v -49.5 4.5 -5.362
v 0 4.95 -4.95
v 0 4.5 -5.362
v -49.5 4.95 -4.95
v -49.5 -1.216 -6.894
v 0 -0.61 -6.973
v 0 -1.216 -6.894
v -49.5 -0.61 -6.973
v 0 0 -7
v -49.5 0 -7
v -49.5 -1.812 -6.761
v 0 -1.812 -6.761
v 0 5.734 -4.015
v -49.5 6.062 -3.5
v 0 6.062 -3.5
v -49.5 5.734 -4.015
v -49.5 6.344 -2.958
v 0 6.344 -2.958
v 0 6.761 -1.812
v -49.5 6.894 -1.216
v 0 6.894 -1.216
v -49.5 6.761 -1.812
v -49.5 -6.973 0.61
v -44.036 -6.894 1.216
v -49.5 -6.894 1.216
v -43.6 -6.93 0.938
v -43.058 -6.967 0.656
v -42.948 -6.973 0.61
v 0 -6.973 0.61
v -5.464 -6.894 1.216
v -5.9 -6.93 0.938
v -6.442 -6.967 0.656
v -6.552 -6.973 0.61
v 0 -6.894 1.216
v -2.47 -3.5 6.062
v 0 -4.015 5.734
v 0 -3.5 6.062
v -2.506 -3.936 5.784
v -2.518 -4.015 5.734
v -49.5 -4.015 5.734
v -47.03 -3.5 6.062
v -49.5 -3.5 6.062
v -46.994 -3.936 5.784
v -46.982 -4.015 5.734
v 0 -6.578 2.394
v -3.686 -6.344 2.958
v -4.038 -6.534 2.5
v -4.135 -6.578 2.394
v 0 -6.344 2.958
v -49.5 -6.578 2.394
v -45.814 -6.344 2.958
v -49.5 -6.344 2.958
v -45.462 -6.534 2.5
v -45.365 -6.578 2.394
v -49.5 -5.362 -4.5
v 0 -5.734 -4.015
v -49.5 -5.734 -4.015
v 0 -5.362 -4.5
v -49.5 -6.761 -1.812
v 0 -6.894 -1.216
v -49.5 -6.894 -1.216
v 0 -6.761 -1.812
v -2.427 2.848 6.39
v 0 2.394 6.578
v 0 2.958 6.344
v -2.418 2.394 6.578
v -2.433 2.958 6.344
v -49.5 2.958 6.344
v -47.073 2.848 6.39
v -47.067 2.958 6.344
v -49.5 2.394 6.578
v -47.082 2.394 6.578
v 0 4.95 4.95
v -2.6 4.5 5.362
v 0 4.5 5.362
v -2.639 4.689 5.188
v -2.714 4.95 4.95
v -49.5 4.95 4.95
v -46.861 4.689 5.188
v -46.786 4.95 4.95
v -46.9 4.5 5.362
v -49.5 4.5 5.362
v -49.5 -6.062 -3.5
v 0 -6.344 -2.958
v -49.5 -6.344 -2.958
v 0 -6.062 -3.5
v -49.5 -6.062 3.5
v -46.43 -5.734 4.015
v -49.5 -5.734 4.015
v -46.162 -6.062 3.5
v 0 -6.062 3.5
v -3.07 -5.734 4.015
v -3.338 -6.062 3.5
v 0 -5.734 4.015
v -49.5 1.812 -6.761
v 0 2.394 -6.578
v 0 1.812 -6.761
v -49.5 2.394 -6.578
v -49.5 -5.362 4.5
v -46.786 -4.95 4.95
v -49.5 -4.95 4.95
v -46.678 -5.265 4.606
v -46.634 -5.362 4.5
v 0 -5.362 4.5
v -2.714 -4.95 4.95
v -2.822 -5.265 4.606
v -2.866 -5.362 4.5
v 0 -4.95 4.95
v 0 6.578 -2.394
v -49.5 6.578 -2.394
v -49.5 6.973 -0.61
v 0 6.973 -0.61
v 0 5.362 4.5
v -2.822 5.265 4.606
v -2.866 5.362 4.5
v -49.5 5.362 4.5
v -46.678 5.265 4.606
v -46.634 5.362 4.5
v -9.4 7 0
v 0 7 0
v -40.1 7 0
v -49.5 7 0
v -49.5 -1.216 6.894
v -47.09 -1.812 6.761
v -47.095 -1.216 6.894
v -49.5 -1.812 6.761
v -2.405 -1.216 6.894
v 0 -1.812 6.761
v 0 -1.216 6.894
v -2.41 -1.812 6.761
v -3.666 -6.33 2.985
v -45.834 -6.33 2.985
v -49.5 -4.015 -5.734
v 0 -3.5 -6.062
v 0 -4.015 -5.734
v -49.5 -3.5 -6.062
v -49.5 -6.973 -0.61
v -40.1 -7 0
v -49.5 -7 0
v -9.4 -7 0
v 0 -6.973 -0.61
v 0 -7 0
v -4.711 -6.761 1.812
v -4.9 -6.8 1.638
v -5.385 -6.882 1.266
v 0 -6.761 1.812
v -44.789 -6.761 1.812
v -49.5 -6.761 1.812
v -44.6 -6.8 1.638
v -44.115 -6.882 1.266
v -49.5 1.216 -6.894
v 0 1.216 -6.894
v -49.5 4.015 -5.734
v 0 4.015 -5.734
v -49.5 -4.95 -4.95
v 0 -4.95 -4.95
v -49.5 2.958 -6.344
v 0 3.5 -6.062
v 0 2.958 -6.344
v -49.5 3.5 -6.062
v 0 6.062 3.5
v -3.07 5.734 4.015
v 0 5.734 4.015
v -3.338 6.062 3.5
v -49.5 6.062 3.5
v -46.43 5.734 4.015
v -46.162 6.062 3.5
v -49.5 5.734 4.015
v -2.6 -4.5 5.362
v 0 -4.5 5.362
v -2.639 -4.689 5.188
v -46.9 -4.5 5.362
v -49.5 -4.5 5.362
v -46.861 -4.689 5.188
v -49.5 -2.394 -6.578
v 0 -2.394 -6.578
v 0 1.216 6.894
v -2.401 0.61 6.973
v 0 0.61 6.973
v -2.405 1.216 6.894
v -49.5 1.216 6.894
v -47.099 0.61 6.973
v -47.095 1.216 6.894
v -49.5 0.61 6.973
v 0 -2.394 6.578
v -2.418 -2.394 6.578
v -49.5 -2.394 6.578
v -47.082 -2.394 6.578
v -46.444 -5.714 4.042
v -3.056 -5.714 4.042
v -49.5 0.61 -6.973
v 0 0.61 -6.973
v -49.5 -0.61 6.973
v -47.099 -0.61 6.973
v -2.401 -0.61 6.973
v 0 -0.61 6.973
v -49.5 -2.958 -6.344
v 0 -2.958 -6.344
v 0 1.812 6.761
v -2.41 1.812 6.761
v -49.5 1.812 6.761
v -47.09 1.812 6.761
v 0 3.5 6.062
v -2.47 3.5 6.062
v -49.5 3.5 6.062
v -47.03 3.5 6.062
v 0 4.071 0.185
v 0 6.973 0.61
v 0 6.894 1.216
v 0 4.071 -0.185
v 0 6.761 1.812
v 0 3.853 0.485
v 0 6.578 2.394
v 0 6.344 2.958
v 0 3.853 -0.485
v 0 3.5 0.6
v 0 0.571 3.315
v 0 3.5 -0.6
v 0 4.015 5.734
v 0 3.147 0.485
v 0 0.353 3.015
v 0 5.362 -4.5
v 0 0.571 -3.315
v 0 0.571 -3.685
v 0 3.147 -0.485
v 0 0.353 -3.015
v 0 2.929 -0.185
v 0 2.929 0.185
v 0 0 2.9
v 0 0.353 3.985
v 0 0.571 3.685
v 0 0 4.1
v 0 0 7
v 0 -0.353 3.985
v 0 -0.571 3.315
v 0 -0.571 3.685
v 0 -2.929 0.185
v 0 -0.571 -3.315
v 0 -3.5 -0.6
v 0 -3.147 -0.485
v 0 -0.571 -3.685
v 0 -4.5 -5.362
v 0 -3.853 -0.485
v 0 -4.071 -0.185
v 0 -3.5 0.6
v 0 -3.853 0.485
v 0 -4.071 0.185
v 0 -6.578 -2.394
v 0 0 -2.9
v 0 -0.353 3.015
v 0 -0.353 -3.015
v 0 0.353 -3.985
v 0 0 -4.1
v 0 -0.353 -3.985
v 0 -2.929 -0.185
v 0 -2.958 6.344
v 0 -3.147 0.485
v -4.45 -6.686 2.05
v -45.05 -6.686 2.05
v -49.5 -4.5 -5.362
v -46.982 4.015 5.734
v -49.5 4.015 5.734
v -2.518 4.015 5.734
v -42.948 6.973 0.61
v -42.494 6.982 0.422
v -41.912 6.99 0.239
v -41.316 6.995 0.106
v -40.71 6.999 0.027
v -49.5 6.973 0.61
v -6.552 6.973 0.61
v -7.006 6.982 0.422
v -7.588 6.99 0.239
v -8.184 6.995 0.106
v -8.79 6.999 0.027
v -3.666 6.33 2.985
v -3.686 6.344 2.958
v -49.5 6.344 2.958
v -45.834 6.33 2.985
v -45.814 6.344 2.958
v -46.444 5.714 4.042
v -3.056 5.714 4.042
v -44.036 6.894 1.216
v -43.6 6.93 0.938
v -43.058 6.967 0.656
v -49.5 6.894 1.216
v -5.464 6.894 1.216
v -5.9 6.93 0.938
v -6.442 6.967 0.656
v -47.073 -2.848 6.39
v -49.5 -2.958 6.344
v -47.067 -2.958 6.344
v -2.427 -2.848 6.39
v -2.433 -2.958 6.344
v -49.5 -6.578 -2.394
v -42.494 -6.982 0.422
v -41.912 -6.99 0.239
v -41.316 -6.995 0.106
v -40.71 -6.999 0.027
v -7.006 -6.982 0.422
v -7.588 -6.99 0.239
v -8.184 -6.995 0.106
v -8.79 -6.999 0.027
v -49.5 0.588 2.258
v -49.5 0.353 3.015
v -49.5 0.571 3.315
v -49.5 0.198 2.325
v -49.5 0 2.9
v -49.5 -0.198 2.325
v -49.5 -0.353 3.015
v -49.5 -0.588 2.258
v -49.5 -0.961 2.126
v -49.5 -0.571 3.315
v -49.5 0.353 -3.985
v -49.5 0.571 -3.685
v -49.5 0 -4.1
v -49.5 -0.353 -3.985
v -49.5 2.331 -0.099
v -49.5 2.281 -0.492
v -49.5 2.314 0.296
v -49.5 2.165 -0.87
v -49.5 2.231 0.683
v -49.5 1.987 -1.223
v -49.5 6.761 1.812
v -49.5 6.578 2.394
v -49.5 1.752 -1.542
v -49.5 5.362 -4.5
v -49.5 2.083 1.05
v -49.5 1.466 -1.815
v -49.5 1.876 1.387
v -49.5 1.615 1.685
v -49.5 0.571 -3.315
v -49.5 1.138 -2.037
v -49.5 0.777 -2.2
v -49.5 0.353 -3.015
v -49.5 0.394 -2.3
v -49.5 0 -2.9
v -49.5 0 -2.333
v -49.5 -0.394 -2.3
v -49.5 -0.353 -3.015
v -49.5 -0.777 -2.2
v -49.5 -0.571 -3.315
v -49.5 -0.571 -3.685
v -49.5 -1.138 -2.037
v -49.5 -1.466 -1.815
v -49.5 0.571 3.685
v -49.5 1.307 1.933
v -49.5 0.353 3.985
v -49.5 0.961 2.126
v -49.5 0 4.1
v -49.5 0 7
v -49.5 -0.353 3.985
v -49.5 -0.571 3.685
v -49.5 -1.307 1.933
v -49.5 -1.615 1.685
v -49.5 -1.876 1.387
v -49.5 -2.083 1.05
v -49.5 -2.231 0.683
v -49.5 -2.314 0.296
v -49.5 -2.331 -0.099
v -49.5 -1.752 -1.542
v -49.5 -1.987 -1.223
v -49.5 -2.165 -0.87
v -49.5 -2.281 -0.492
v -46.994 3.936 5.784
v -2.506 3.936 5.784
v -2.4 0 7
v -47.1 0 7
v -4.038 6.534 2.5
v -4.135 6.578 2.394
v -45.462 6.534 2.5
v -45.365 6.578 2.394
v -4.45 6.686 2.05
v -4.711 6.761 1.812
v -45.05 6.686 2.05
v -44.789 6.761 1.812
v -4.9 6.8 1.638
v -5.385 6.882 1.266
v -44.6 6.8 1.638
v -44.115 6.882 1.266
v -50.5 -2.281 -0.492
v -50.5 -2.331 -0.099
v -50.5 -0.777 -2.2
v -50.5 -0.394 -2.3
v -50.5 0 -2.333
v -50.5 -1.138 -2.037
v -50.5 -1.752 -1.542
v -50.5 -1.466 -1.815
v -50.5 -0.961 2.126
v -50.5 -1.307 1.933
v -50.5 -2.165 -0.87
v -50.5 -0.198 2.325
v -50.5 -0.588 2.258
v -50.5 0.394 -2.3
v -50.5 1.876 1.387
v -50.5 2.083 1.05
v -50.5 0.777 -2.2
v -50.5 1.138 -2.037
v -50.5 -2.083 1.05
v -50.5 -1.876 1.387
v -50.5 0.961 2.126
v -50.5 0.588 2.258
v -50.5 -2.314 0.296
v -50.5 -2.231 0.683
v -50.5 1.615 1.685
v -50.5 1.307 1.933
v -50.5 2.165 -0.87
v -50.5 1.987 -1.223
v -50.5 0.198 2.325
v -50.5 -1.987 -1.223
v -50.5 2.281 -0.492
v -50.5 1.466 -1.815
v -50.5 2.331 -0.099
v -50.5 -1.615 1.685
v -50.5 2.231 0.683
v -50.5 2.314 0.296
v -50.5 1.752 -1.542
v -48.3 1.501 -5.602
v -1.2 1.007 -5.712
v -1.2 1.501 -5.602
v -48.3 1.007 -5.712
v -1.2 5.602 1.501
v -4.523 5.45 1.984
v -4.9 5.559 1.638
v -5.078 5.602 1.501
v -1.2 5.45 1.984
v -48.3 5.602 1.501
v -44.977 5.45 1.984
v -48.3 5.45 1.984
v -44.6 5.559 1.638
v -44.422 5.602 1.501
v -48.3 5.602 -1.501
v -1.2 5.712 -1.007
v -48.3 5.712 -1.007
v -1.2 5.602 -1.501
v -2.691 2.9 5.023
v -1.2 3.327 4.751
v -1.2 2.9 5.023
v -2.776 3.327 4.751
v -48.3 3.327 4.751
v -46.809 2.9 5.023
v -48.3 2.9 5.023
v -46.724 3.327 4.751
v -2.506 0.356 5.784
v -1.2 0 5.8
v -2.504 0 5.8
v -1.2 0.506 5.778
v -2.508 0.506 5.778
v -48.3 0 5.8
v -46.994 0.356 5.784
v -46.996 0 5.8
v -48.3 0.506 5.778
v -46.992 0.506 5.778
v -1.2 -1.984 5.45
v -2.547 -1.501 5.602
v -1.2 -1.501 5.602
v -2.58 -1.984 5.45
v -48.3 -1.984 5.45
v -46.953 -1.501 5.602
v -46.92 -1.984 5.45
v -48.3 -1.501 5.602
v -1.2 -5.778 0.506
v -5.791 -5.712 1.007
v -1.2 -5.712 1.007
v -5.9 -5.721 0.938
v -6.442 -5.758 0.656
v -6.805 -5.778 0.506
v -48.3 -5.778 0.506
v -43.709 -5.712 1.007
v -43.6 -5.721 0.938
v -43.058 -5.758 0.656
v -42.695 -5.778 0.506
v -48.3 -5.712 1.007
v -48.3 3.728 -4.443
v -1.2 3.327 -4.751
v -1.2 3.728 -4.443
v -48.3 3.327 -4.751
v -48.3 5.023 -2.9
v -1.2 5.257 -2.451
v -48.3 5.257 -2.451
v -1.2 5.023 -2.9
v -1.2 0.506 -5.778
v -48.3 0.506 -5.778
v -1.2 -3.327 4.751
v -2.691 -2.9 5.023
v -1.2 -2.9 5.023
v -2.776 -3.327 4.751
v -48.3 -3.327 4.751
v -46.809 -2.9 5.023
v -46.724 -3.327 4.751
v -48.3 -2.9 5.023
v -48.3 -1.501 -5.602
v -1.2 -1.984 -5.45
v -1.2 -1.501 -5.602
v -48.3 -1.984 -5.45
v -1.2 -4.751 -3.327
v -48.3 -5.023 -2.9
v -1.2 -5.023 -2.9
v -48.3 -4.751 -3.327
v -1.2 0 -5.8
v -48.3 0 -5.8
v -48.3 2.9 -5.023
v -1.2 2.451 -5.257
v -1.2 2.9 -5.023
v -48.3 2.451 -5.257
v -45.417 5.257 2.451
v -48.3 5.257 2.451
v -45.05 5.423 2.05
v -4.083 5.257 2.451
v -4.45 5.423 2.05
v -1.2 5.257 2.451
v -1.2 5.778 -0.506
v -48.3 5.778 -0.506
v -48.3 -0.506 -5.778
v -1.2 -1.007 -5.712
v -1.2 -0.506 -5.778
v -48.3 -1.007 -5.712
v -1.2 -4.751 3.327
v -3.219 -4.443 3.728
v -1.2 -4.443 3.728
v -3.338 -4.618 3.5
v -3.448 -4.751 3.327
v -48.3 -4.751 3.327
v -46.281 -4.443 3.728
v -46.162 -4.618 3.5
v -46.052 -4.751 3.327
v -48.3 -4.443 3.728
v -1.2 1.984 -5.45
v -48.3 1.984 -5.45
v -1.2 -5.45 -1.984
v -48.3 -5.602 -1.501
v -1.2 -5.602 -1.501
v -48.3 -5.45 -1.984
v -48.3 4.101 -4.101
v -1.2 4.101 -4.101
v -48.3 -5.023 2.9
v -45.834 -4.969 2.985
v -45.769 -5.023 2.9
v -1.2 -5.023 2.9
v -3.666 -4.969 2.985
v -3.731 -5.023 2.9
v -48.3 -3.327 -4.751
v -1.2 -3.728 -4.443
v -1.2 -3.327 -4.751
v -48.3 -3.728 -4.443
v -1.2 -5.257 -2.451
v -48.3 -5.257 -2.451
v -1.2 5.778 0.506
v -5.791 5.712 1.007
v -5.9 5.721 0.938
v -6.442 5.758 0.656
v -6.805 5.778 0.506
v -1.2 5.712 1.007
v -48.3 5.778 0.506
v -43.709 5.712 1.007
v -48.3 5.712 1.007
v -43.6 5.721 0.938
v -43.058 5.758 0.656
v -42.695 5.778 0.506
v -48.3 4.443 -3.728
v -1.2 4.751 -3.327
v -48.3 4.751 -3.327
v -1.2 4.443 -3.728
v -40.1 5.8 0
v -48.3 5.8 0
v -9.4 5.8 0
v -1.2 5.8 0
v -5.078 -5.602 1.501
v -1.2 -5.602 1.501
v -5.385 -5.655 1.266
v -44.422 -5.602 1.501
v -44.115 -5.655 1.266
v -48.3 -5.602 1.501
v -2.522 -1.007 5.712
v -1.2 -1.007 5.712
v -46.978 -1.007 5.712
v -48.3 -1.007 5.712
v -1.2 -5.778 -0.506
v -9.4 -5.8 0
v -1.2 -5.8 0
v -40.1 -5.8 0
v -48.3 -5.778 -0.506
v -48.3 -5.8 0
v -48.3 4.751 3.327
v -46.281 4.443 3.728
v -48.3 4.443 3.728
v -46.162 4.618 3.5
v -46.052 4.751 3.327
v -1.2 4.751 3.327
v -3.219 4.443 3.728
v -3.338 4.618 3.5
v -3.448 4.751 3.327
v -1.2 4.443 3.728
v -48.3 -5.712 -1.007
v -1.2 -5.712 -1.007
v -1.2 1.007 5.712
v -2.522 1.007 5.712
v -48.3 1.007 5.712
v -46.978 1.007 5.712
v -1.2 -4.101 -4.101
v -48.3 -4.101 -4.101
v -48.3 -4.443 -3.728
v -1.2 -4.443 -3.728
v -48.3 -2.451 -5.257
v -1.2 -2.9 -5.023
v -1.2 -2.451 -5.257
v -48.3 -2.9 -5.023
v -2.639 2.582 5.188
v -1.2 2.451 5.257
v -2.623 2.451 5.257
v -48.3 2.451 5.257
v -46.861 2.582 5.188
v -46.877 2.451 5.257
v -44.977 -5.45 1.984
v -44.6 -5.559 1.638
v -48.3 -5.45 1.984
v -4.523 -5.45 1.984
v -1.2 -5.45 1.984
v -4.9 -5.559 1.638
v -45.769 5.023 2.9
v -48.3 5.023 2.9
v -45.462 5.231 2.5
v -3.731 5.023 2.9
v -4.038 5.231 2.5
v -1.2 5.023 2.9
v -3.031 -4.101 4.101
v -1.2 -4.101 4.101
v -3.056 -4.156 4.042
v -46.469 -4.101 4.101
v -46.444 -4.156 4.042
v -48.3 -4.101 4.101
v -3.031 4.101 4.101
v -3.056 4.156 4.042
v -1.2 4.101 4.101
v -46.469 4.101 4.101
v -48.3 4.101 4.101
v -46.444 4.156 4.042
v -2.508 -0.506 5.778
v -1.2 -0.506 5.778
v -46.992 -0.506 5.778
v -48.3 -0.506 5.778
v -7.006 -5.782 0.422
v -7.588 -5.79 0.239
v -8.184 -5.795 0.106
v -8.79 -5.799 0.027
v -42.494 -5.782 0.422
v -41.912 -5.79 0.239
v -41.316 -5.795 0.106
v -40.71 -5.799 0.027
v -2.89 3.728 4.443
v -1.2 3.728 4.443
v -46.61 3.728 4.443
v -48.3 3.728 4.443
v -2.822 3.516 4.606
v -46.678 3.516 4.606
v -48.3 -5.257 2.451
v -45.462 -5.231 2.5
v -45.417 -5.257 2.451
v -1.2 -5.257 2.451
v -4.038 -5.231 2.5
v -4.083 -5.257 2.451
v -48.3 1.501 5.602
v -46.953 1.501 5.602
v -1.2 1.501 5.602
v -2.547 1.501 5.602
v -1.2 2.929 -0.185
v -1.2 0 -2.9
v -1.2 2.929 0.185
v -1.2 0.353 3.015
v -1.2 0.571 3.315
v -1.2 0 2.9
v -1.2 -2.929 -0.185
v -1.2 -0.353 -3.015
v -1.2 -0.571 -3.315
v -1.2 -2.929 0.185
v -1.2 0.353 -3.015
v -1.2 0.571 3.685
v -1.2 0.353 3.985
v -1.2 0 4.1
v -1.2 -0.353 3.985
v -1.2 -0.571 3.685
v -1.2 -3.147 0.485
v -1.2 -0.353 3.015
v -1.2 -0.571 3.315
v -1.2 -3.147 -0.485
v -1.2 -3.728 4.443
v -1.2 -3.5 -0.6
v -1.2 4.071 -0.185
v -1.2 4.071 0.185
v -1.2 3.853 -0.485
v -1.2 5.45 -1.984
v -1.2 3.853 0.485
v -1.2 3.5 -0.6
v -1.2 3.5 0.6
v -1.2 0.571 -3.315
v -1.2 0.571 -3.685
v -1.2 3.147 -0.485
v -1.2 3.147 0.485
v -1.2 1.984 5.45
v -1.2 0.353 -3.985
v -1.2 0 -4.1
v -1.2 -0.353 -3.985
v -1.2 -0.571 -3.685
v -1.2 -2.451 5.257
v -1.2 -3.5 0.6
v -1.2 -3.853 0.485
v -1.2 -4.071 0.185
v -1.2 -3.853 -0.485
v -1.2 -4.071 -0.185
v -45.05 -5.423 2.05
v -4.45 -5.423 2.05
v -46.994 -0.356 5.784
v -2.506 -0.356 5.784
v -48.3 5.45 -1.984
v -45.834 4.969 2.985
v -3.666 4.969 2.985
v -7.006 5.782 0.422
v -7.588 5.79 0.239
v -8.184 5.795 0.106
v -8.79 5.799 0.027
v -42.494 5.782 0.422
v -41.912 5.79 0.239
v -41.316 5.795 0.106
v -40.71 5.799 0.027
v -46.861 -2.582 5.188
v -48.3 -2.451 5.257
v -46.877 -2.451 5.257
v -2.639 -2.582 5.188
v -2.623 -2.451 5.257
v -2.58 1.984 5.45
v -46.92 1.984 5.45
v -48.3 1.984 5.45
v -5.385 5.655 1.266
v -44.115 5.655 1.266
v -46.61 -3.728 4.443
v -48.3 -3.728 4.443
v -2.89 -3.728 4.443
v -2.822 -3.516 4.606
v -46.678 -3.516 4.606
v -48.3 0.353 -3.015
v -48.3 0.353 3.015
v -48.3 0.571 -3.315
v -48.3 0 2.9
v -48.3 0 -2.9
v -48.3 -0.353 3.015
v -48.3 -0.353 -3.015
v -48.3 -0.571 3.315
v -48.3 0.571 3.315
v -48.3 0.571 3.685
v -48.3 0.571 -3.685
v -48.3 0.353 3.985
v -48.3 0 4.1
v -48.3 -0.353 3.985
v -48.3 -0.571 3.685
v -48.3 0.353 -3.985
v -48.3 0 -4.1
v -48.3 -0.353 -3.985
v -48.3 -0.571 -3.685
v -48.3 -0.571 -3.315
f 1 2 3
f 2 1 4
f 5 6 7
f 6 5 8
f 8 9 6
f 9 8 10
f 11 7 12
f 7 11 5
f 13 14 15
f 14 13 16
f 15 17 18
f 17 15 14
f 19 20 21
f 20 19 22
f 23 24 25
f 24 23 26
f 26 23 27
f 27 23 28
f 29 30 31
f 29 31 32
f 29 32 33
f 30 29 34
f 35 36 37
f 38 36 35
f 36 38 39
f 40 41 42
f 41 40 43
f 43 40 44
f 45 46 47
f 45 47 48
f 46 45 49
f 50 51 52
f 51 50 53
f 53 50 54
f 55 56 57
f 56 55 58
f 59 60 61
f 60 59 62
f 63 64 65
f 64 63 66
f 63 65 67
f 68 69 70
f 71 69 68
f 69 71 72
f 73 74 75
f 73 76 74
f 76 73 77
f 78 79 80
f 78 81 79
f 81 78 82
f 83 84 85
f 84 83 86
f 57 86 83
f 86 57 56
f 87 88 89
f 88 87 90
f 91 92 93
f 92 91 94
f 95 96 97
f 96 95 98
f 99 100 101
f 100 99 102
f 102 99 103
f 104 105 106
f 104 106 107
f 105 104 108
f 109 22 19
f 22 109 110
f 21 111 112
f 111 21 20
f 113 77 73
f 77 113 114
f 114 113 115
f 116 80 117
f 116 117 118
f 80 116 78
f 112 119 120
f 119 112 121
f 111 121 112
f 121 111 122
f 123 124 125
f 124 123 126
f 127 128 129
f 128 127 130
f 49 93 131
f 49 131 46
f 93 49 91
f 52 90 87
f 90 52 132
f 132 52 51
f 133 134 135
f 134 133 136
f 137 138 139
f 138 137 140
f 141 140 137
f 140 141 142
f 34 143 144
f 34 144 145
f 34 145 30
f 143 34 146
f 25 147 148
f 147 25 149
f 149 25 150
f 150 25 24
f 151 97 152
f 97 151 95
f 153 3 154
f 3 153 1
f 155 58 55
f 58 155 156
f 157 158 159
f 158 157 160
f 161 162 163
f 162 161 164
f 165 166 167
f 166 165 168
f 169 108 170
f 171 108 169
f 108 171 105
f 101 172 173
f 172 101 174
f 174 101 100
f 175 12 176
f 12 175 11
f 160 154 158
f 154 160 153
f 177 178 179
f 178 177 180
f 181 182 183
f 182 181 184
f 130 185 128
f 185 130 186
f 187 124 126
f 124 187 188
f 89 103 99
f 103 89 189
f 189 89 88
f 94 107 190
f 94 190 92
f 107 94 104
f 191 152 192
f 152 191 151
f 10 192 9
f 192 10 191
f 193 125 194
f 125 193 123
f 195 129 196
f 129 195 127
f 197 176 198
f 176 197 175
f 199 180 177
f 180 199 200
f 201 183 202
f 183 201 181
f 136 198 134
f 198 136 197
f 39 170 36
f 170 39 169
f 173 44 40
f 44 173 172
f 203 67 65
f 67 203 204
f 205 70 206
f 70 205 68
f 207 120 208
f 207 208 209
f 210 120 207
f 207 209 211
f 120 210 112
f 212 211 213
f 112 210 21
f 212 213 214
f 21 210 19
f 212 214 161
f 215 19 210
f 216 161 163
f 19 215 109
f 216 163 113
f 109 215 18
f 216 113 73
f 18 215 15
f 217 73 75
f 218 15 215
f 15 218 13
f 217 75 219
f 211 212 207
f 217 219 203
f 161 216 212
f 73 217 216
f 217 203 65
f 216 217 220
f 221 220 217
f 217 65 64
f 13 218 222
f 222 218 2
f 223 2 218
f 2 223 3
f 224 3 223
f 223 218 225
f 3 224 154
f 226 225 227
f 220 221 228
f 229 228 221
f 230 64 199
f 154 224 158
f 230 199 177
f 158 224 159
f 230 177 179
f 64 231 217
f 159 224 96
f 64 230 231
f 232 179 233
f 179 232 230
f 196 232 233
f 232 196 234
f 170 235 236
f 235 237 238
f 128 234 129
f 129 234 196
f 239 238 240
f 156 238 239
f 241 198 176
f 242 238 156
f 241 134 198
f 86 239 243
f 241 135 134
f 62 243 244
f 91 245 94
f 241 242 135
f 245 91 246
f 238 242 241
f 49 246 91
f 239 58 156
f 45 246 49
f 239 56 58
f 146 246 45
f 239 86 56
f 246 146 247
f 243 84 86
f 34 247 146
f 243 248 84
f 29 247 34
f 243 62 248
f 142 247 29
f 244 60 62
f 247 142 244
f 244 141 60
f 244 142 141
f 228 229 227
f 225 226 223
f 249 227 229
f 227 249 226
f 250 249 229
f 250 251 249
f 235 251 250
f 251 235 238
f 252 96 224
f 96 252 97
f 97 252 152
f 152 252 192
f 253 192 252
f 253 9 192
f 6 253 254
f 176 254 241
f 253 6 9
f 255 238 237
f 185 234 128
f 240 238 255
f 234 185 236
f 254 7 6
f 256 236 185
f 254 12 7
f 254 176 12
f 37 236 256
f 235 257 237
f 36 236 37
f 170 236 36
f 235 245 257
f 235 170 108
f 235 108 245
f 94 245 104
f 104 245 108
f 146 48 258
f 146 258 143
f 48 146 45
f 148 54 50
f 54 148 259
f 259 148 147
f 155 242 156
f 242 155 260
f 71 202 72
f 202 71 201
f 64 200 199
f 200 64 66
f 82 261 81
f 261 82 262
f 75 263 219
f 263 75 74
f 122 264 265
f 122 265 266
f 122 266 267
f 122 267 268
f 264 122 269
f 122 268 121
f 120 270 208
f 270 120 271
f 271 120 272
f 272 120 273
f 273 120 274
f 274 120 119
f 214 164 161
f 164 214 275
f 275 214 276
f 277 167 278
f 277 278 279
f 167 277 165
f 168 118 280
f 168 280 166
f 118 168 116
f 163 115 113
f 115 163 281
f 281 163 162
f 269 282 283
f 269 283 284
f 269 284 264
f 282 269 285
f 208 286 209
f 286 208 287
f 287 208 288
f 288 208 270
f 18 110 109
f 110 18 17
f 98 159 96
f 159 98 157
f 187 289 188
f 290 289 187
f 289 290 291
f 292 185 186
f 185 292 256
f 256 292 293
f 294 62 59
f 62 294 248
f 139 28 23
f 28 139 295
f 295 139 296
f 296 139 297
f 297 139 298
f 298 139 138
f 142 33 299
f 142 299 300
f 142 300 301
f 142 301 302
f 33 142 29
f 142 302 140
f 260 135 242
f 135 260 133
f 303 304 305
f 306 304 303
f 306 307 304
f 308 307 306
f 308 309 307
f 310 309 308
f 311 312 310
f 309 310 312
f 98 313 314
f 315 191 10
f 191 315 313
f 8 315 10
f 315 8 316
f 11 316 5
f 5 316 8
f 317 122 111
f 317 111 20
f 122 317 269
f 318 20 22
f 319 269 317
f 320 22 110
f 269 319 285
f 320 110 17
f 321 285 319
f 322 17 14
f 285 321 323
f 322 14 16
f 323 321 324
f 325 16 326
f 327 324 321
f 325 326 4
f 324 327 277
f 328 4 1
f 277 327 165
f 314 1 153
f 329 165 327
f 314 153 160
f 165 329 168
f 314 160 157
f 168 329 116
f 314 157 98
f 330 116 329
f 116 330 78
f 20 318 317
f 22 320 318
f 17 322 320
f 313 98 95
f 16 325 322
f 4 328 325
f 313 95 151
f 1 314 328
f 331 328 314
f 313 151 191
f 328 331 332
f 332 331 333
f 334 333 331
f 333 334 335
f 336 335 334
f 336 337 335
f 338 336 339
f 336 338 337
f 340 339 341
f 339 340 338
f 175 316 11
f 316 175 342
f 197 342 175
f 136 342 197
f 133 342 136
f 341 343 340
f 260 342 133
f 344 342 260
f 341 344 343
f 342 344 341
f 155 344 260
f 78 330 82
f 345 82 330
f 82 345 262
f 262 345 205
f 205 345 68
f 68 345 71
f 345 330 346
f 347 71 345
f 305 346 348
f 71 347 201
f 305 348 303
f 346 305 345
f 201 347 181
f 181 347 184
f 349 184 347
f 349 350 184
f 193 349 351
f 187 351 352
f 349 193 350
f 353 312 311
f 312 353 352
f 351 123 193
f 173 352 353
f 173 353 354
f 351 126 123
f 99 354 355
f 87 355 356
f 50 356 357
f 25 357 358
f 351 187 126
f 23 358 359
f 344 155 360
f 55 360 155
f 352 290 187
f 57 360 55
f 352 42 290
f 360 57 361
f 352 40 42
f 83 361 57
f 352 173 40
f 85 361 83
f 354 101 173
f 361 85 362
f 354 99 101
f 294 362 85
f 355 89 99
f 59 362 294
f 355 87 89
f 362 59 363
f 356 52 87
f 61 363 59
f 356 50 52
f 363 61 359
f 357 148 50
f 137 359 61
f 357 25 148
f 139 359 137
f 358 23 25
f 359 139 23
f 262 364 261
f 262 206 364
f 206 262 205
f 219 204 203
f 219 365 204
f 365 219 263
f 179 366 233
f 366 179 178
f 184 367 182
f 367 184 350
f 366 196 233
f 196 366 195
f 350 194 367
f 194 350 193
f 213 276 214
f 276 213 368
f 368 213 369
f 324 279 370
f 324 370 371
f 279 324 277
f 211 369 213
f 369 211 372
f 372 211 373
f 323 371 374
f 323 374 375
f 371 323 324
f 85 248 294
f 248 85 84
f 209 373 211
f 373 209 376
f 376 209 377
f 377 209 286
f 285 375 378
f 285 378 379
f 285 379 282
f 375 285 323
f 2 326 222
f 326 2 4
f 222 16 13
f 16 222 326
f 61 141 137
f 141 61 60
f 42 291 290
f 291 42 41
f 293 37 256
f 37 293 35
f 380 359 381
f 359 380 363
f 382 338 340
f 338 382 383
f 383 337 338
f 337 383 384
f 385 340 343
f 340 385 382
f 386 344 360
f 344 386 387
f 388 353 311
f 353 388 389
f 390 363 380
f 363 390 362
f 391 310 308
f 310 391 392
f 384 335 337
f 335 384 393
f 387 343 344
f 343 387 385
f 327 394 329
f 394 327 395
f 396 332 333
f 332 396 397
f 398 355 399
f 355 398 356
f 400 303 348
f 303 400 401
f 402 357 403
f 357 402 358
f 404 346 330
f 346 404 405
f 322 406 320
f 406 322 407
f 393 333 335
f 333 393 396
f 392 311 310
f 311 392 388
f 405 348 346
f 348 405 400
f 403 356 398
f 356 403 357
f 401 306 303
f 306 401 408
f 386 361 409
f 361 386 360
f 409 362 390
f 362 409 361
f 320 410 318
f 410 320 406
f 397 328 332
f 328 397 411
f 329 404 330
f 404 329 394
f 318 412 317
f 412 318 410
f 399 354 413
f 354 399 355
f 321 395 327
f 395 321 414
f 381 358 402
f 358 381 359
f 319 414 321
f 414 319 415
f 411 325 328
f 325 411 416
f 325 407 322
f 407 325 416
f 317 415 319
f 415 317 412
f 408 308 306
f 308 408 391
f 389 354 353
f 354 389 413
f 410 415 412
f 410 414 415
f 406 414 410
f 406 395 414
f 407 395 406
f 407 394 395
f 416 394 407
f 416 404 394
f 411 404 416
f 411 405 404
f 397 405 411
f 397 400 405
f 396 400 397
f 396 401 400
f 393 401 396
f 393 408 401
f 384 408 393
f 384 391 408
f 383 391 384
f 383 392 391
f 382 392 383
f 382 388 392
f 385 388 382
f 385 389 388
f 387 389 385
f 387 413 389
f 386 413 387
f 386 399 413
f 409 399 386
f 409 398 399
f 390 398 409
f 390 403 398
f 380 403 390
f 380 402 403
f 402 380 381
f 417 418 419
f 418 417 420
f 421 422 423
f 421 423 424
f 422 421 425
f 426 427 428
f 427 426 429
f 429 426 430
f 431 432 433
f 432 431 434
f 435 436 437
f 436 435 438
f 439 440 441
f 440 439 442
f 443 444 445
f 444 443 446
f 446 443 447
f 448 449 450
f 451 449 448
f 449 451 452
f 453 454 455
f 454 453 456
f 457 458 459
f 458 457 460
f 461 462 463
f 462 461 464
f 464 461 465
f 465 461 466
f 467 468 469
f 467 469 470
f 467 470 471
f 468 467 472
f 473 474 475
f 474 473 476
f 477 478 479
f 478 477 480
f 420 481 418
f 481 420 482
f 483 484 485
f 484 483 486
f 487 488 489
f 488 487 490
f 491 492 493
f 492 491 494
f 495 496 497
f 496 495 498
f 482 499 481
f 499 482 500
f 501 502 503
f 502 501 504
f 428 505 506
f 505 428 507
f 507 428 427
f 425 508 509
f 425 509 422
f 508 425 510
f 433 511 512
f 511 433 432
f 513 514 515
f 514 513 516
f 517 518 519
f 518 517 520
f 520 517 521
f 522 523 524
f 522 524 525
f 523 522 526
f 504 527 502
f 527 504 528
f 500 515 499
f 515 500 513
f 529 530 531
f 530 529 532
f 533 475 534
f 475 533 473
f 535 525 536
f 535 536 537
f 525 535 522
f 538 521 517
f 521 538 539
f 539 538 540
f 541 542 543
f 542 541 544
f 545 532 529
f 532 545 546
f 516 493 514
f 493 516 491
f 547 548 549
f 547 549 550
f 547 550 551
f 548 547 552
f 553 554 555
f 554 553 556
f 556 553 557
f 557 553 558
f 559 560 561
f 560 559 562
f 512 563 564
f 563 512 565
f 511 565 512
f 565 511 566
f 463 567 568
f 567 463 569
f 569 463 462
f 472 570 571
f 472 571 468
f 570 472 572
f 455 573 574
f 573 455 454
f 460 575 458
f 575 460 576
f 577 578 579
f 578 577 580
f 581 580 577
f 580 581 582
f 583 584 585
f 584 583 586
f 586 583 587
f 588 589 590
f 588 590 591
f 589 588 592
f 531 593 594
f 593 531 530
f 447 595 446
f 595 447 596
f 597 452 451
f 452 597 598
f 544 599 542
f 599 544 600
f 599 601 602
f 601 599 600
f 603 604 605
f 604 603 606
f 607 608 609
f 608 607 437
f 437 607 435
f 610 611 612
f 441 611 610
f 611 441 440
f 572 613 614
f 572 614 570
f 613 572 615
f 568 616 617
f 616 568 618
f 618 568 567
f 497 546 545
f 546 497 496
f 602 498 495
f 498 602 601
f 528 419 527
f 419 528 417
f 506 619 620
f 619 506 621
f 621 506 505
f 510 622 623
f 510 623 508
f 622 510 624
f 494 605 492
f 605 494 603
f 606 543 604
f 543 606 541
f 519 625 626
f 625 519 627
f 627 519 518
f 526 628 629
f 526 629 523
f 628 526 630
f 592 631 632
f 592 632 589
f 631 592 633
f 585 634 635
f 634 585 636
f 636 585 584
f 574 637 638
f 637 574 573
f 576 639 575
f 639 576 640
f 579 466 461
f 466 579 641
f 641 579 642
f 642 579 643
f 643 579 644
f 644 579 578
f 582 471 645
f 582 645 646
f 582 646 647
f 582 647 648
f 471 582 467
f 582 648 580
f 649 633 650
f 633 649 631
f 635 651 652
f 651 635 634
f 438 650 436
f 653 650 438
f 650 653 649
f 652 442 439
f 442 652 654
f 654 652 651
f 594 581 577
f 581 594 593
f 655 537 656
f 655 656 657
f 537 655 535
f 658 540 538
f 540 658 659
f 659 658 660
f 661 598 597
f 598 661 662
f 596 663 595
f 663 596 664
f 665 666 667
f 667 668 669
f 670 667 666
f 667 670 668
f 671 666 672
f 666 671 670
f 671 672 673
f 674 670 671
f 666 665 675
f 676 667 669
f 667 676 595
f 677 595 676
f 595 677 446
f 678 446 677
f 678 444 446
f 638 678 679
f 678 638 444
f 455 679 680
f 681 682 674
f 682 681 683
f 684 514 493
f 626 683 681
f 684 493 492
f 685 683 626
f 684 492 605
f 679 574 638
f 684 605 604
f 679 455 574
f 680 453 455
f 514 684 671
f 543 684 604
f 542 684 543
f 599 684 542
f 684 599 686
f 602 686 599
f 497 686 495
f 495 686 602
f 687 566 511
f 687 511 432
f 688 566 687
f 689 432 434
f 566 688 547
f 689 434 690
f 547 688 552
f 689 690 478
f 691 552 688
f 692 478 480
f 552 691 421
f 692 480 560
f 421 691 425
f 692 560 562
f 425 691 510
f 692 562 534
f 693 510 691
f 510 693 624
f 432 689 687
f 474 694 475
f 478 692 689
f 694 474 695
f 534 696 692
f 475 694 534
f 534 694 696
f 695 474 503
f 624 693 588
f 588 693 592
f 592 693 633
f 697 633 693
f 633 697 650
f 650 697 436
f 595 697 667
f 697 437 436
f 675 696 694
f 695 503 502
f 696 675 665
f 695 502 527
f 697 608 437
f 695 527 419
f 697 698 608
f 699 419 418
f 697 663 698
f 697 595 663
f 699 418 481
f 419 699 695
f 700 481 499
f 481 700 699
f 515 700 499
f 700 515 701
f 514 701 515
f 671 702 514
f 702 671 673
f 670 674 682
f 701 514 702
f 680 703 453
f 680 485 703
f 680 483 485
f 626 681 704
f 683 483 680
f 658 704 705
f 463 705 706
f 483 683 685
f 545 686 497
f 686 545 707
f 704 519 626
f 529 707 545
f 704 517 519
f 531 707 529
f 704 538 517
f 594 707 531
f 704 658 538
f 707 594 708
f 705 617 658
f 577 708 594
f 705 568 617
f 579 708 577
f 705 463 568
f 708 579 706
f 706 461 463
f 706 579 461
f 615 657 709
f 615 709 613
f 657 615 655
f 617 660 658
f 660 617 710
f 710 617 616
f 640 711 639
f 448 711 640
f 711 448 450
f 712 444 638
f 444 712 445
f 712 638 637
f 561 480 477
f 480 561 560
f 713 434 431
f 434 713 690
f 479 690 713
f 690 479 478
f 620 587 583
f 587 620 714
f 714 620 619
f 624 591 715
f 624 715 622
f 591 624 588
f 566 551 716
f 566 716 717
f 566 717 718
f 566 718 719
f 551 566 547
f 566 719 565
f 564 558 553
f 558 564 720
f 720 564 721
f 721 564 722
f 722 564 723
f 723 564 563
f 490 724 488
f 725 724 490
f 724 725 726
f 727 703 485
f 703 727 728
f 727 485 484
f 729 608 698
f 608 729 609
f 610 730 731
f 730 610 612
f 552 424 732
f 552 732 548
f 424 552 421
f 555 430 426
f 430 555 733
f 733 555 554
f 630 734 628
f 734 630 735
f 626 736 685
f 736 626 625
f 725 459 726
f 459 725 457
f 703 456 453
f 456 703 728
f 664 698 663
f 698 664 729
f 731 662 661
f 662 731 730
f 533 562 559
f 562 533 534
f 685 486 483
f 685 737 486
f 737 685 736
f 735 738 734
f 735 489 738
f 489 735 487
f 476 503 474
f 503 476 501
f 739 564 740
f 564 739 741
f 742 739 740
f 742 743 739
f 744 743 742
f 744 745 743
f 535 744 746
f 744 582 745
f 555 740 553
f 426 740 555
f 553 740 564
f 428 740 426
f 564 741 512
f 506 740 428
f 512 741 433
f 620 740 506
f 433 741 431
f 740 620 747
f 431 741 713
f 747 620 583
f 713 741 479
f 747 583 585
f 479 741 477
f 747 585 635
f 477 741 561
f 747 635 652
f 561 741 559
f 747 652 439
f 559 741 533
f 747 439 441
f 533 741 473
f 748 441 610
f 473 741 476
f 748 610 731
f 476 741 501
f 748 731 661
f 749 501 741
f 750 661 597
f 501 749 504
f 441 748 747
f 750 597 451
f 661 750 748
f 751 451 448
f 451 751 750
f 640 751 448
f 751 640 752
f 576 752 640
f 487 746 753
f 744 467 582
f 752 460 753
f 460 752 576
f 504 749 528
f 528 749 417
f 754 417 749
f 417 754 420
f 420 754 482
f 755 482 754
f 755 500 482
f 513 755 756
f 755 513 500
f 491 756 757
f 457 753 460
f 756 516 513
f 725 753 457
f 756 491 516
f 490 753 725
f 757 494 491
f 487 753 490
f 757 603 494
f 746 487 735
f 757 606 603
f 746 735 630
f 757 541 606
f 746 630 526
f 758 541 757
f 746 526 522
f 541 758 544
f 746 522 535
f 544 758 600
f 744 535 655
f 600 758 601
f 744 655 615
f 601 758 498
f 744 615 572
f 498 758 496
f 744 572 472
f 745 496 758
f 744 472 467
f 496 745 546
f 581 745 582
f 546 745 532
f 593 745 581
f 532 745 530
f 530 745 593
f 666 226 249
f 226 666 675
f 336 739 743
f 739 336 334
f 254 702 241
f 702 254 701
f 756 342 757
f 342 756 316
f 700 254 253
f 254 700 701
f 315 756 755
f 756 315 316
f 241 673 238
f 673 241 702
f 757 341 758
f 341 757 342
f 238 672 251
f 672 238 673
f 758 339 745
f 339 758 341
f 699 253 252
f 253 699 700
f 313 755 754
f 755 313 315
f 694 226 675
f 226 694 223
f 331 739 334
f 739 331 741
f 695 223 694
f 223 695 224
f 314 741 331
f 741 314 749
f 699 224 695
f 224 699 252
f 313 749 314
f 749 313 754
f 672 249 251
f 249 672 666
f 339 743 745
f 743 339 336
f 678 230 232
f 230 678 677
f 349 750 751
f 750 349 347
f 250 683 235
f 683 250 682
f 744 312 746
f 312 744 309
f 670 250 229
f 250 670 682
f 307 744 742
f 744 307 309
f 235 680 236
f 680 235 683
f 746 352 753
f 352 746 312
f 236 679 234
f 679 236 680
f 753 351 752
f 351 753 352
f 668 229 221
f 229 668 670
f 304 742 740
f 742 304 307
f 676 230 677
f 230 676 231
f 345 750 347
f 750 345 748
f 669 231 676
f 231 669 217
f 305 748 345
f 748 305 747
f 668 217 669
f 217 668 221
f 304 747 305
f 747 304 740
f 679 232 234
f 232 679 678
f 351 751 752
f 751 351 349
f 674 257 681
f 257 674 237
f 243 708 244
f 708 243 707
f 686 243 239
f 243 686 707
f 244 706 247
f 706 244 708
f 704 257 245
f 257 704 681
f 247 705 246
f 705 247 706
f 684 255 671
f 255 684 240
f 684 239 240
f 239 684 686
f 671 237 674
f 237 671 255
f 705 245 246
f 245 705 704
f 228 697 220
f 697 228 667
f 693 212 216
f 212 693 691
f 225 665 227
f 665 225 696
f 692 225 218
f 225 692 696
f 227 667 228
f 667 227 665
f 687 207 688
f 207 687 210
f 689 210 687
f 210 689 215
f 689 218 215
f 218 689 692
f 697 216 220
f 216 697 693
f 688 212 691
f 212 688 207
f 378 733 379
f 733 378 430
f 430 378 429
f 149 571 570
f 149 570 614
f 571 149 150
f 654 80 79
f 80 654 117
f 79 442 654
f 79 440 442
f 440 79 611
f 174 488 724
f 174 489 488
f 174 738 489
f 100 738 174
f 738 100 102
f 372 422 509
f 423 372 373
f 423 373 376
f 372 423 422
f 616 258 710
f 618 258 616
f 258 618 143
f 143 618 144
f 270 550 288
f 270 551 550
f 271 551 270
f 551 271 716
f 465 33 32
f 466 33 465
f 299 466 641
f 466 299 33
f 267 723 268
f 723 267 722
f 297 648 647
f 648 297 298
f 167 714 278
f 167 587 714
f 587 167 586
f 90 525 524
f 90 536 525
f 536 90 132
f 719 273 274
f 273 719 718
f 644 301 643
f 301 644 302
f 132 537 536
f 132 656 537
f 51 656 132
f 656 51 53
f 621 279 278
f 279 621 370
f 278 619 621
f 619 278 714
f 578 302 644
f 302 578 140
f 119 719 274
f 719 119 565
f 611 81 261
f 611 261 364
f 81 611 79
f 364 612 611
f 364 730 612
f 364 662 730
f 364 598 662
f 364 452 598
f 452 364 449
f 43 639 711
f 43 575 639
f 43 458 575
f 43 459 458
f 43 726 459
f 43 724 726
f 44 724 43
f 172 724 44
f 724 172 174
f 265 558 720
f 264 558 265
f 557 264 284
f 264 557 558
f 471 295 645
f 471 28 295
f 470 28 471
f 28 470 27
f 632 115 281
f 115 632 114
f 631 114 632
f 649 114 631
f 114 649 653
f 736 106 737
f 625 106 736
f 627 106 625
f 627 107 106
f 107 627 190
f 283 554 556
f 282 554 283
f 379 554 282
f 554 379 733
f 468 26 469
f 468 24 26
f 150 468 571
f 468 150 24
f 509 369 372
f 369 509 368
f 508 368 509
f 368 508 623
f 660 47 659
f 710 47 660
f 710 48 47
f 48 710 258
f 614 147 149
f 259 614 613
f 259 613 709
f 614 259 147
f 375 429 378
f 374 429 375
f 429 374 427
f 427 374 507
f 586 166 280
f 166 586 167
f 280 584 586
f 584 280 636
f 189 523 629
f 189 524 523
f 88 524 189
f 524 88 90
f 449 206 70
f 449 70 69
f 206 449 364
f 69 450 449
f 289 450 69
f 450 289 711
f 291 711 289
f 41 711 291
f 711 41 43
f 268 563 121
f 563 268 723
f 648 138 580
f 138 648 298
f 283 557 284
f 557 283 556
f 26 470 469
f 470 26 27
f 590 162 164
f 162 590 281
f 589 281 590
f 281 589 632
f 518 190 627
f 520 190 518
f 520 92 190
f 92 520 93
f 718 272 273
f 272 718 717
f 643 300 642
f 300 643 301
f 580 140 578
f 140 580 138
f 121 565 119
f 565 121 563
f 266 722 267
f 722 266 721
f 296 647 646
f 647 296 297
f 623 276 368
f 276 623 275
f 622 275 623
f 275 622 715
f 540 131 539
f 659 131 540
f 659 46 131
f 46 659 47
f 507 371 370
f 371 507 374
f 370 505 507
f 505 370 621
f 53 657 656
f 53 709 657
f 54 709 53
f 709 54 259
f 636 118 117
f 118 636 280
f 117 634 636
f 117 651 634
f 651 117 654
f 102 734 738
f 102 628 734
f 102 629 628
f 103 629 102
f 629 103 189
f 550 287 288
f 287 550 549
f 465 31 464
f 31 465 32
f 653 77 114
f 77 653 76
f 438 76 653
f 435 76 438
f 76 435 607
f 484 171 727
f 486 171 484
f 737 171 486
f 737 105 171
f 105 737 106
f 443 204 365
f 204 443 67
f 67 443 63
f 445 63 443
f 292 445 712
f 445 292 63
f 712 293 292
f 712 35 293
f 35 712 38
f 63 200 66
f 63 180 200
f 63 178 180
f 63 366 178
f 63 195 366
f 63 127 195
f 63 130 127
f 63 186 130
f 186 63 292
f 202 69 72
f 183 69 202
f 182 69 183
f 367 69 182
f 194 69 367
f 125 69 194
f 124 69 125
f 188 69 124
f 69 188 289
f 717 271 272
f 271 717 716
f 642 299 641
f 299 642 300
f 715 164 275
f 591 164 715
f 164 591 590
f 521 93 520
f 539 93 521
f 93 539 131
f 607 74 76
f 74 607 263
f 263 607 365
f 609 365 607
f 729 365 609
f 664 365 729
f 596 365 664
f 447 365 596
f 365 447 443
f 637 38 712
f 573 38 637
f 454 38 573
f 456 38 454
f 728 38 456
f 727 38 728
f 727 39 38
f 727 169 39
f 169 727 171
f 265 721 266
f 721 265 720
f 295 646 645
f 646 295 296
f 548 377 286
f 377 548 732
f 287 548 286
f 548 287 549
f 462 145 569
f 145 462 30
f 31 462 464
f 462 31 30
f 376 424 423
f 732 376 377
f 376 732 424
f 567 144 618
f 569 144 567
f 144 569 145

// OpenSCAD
////////////////////////////////////////////////////////////////////////////////
//
// https://en.wikipedia.org/wiki/List_of_battery_sizes
//
// https://en.wikipedia.org/wiki/AA_battery
// An AA cell measures 49.2-50.5 mm (1.94-1.99 in) in length, including the
// button terminal-and 13.5-14.5 mm (0.53-0.57 in) in diameter. The positive
// terminal button should be a minimum 1 mm high and a maximum 5.5 mm in
// diameter, the flat negative terminal should be a minimum diameter of 7 mm
//
// https://en.wikipedia.org/wiki/AAA_battery
// A triple-A battery is a single cell and measures 10.5 mm in diameter and
// 44.5 mm in length, including the positive terminal button, which is a
// minimum 0.8 mm high. The positive terminal has a maximum diameter of 3.8 mm;
// the flat negative terminal has a minimum diameter of 4.3 mm.
//
// A 'C' battery measures 50 millimetres (1.97 in) length and 26.2 millimetres
// (1.03 in) diameter.
//
////////////////////////////////////////////////////////////////////////////////

battery_type    = "AA" ; // [AAA,AA,C,D,Generic,Demo]

/* [Settings for Generic Battery (mm)] */
body_radius     =  7.0 ; // [4:0.1:20]
body_height     = 48.4 ; // [35:0.1:60]
body_wall_width =  1.2 ; // [0.7:0.1:5]
pin_height      =  1.0 ; // [0.7:0.1:2.5]
wire_diameter   =  1.2 ; // [0.7:0.1:2]

////////////////////////////////////////////////////////////////////////////////

/* [Hidden] */

// column index into Batt
cName   = 0 ; // name
cRadius = 1 ; // body radius
cHeight = 2 ; // body height
cWidth  = 3 ; // wall width
cPin    = 4 ; // pin height
cWire   = 5 ; // wire diameter

/*
  D   Overall Length: 61.5mm (http://data.energizer.com/pdfs/e95.pdf)
  C   Overall Length: 50.0mm (http://data.energizer.com/pdfs/e93.pdf)
  AA  Overall Length: 50.5mm (http://data.energizer.com/pdfs/e91.pdf)
  AAA Overall Length: 44.5mm (http://data.energizer.com/pdfs/l92.pdf)
*/

// Note: Battery length is the height of the battery body and plus the pin height.
Batt =
[ // name, radi, heig, wid, pin, wire
  [ "D"  , 17.1, 60.0, 1.5, 1.5, 1.2 ],
  [ "C"  , 13.1, 48.5, 1.5, 1.5, 1.2 ],
  [ "AA" ,  7  , 49.5, 1.2, 1  , 1.2 ],
  [ "AAA",  5.2, 43.7, 1  , 0.8, 1.2 ]
] ;

$fa =  5 ;
$fs =  0.4 ;

////////////////////////////////////////////////////////////////////////////////

module battery(batt)
{
  difference()
  {
    union()
    {
      cylinder(h=batt[cHeight], r=batt[cRadius]); // outer
      translate([0,0,batt[cHeight]-0.1])
      {
	cylinder(h=batt[cPin]+0.1, r=batt[cRadius]/3) ; // pin on top
      }
    }
    translate([0, 0, batt[cWidth]]) { cylinder(h=batt[cHeight]-2*batt[cWidth], r=batt[cRadius]-batt[cWidth]) ; }  // inner
    translate([ batt[cRadius]/2, 0,-batt[cRadius]]) { cylinder(h=batt[cHeight]  +2*batt[cRadius], d=batt[cWire]) ; } // wire 1
    translate([-batt[cRadius]/2, 0,-batt[cRadius]]) { cylinder(h=batt[cHeight]  +2*batt[cRadius], d=batt[cWire]) ; } // wire 2
    translate([0, batt[cRadius]/2,-batt[cRadius]])  { cylinder(h=batt[cHeight]/2+2*batt[cRadius], d=batt[cWire]) ; } // neg terminal wire 3
    translate([0,-batt[cRadius]/2,-batt[cRadius]])  { cylinder(h=batt[cHeight]/2+2*batt[cRadius], d=batt[cWire]) ; } // neg terminal wire 4

    hull() // cut-out
    {
      translate([-batt[cRadius], batt[cRadius], batt[cRadius]+2*batt[cWidth]])
        rotate([90,0,0])
        cylinder(h=2*batt[cRadius], r=batt[cRadius]) ;
      translate([-batt[cRadius], batt[cRadius], batt[cHeight]-batt[cRadius]-2*batt[cWidth]])
        rotate([90,0,0])
        cylinder(h=2*batt[cRadius], r=batt[cRadius]) ;
    }
  }
}

////////////////////////////////////////////////////////////////////////////////

module batteryType(battery_type, body_radius, body_height, body_wall_width, pin_height, wire_diameter)
{
  idx = search([battery_type], Batt) ;
  if (idx != [[]])
  {
    battery(Batt[idx[0]]) ;
  }
  else if (battery_type == "Demo")
  {
    iD   = search(["D"  ], Batt) ;   rD   = Batt[iD  [0]][cRadius] ;
    iC   = search(["C"  ], Batt) ;   rC   = Batt[iC  [0]][cRadius] ;
    iAA  = search(["AA" ], Batt) ;   rAA  = Batt[iAA [0]][cRadius] ;
    iAAA = search(["AAA"], Batt) ;   rAAA = Batt[iAAA[0]][cRadius] ;

    dD   =   rD                              ; translate([-rD  , dD  , 0]) batteryType("D"  ) ;
    dC   = 2*rD +   rC                  + 10 ; translate([-rC  , dC  , 0]) batteryType("C"  ) ;
    dAA  = 2*rD + 2*rC +   rAA          + 20 ; translate([-rAA , dAA , 0]) batteryType("AA" ) ;
    dAAA = 2*rD + 2*rC + 2*rAA +   rAAA + 30 ; translate([-rAAA, dAAA, 0]) batteryType("AAA") ;
  }
  else
  {
    battery(["Generic", body_radius, body_height, body_wall_width, pin_height, wire_diameter]) ;
  }
}

////////////////////////////////////////////////////////////////////////////////

rotate([0,0,180])
rotate([0, 90, 0])
  batteryType(battery_type, body_radius, body_height, body_wall_width, pin_height, wire_diameter) ;

////////////////////////////////////////////////////////////////////////////////
// EOF
////////////////////////////////////////////////////////////////////////////////
